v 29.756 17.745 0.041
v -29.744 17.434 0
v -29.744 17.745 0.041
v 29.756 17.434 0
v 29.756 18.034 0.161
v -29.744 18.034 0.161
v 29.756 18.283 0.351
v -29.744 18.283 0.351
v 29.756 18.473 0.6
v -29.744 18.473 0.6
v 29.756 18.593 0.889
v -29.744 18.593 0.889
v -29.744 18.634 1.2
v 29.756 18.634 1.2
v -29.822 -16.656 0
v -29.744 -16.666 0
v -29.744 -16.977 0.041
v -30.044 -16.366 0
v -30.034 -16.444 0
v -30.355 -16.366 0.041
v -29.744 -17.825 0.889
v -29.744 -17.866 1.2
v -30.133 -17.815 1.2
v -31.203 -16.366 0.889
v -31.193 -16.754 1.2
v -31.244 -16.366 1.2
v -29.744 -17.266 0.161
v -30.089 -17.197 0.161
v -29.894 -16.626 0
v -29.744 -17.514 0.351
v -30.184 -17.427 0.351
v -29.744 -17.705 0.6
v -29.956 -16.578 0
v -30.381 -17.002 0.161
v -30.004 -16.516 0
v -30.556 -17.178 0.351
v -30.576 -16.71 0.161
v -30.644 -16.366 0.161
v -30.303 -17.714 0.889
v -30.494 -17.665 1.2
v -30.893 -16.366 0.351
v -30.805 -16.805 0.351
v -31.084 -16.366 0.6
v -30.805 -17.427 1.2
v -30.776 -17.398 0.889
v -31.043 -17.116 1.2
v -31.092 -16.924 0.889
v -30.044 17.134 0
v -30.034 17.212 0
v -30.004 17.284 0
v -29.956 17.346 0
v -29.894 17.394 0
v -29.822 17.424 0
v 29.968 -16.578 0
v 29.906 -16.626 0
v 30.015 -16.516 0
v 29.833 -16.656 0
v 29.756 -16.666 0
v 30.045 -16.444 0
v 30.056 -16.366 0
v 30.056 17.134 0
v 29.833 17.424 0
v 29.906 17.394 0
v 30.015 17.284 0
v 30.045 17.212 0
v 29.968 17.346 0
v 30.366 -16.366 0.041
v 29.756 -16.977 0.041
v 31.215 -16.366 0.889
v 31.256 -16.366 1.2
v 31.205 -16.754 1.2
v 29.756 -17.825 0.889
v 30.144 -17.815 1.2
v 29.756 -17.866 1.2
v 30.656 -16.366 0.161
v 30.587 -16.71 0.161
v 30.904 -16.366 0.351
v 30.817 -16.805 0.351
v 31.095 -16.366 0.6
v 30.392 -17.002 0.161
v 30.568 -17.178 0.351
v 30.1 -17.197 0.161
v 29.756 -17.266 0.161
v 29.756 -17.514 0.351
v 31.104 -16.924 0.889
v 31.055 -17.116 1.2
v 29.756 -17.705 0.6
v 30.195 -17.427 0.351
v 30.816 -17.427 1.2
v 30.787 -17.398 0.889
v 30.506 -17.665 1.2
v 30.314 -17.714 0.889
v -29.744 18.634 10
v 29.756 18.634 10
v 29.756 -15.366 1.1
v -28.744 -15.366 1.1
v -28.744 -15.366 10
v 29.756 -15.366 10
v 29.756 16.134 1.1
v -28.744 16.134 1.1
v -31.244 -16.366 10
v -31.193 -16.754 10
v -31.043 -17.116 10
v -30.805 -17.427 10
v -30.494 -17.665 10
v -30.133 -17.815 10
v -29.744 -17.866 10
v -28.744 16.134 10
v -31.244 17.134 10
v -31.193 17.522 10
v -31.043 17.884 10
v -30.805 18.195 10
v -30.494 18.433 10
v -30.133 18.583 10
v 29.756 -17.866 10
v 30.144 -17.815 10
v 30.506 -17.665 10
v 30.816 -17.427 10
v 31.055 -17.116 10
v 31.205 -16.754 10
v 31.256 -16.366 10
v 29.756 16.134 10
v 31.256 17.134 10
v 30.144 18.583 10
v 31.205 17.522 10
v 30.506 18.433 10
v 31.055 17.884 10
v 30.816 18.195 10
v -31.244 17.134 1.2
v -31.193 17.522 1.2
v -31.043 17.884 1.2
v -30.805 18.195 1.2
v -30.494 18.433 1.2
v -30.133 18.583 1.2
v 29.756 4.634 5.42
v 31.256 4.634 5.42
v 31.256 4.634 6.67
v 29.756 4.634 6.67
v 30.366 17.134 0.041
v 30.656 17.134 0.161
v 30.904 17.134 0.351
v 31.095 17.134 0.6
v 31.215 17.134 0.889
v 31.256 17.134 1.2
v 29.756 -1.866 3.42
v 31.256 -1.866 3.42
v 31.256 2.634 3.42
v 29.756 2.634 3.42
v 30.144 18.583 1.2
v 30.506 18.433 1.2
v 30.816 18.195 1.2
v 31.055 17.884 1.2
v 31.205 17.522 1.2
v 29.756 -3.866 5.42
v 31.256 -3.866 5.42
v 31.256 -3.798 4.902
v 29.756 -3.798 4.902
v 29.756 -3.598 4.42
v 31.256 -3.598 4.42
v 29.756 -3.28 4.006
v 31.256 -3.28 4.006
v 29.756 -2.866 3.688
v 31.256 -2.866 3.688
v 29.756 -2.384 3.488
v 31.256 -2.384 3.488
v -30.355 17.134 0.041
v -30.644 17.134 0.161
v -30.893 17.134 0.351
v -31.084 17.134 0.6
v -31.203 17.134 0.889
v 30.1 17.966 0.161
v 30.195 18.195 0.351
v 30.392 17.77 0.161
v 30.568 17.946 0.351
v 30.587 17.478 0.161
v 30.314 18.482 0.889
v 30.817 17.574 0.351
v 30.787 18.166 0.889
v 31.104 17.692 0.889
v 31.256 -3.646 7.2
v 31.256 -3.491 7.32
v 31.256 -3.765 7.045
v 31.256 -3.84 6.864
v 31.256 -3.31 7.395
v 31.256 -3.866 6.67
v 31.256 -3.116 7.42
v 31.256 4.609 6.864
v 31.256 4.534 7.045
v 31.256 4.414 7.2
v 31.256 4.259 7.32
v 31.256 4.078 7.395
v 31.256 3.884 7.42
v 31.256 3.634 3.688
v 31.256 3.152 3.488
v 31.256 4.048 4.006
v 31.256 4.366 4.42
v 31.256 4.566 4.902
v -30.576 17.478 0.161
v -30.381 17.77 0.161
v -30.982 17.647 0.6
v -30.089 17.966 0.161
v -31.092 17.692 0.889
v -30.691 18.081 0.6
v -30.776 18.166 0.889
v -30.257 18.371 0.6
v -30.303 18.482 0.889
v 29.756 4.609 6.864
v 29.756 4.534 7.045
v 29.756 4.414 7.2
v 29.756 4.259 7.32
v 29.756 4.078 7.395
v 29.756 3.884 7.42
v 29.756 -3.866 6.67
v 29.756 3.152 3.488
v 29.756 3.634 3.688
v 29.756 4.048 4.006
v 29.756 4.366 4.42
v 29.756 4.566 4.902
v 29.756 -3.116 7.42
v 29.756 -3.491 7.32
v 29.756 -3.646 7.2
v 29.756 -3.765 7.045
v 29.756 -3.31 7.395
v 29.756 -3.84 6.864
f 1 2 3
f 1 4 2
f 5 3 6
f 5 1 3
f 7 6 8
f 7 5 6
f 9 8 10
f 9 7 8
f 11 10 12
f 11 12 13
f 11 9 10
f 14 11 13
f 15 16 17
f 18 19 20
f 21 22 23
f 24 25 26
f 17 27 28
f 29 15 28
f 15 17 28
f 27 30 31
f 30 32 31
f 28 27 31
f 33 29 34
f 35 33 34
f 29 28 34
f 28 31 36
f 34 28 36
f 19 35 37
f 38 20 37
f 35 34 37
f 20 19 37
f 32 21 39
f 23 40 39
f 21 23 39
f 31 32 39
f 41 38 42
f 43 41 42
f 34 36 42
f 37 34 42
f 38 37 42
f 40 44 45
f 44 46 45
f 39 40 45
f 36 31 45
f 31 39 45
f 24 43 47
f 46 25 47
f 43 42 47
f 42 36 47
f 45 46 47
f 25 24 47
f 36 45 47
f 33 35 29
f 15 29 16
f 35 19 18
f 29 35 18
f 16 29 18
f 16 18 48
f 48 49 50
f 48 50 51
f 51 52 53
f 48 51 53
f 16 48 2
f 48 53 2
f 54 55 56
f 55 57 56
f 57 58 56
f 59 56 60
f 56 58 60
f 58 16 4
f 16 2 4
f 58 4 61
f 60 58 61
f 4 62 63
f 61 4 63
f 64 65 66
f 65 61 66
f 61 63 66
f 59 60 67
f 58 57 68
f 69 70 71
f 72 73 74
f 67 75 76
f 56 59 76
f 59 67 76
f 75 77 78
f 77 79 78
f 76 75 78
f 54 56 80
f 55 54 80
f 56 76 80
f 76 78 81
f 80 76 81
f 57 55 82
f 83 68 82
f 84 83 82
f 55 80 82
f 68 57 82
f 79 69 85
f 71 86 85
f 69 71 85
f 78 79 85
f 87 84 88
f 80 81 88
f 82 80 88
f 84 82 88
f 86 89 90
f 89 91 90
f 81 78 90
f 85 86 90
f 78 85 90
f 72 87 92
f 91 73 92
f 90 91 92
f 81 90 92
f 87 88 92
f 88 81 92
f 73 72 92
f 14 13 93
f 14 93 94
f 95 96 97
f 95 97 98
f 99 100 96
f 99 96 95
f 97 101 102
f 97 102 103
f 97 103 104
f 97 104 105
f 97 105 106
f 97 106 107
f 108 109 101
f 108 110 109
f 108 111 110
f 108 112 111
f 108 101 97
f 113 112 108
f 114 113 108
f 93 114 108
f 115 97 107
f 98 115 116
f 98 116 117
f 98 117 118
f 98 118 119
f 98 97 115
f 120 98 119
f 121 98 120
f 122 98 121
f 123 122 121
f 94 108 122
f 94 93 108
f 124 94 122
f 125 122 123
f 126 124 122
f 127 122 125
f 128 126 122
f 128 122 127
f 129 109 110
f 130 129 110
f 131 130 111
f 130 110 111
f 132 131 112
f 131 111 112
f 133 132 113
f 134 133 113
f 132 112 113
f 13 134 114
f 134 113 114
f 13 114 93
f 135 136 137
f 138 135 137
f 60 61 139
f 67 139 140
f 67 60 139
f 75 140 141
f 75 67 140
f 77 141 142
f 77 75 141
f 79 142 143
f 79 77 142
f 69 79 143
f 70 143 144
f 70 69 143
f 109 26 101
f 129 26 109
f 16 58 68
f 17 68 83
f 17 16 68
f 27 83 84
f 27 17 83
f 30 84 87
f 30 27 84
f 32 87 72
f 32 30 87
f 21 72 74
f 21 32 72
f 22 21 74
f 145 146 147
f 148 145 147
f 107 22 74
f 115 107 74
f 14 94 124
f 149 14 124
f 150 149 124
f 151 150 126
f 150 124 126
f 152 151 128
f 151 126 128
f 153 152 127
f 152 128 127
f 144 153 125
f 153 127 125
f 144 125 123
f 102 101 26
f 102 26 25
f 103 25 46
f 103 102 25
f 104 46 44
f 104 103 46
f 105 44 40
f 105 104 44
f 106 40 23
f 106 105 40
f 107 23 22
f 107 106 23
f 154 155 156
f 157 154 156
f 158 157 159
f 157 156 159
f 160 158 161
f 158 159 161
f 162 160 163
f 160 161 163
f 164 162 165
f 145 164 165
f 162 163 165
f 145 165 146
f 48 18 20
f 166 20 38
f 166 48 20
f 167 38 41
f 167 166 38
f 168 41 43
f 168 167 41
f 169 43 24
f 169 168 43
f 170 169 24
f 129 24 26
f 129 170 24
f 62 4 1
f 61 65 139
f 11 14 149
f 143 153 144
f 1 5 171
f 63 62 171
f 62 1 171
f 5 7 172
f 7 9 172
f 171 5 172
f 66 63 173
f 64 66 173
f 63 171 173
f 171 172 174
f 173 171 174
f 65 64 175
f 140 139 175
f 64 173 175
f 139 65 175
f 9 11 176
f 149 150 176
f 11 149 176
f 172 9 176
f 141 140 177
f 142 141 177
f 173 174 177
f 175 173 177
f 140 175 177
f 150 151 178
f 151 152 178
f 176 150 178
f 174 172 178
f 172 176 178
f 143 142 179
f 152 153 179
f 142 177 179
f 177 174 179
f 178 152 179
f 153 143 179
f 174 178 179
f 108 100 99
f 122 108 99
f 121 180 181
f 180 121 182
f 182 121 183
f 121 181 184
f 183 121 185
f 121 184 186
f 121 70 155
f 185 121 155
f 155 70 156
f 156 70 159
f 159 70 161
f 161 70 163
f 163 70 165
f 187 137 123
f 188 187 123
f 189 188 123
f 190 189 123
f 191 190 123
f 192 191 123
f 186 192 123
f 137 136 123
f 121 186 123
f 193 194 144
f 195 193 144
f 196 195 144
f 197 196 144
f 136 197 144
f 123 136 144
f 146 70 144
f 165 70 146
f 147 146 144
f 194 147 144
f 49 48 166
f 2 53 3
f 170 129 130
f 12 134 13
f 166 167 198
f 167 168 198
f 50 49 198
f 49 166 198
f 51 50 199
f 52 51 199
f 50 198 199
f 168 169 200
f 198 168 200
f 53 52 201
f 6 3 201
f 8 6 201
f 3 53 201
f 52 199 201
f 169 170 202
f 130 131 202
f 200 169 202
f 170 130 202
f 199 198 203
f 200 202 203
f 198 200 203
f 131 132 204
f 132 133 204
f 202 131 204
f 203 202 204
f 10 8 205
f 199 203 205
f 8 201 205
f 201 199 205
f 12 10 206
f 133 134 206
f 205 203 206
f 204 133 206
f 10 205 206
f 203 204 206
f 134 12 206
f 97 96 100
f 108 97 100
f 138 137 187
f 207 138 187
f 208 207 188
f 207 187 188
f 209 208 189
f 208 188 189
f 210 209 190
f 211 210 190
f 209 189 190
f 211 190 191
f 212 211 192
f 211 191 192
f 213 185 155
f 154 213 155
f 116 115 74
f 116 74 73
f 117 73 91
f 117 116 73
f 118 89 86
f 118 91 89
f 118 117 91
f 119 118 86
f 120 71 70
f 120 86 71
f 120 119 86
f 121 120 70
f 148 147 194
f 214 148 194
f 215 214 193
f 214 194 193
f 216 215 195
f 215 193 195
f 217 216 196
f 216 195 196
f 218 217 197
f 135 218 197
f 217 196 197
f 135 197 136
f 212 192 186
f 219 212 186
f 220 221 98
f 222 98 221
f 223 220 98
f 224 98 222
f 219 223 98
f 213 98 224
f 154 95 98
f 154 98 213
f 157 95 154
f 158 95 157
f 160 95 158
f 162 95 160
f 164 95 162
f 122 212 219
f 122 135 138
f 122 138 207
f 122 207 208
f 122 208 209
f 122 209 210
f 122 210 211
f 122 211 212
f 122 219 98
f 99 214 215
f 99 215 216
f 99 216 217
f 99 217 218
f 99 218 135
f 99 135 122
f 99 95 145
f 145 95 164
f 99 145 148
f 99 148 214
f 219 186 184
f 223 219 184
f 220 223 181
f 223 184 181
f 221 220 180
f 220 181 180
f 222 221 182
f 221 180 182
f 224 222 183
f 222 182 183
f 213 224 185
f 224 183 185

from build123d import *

# Parameters (mm, degrees)
F0_W     = 62.5
F0_H     = 36.5
F0_W_2   = 58.5
F0_H_2   = 31.5
F1_DEPTH = 10
F2_DEPTH = 1.1
F3_R     = 1.5
F4_R     = 1.2
F6_DEPTH = 3


with BuildPart() as f1:
    # F0 (on Top) → F1 (new body)
    with BuildSketch(Plane.XY):
        with Locations((0.005647, 0.384062)):
            Rectangle(F0_W, F0_H)
        with Locations((0.505647, 0.384062)):
            Rectangle(F0_W_2, F0_H_2, mode=Mode.SUBTRACT)
    extrude(amount=F1_DEPTH)

    # F0 (on Top) → F2 (join)
    with BuildSketch(Plane.XY):
        with Locations((0.505647, 0.384062)):
            Rectangle(F0_W_2, F0_H_2)
    extrude(amount=F2_DEPTH)

    # F3
    f3_edges = [f1.edges().sort_by_distance(p)[0] for p in [
        (31.255647, -17.865938, 5),
        (31.255647, 18.634062, 5),
        (-31.244353, 18.634062, 5),
        (-31.244353, -17.865938, 5),
    ]]
    fillet(f3_edges, radius=F3_R)

    # F4
    f4_edges = [f1.edges().sort_by_distance(p)[0] for p in [
        (0.005647, 18.634062, 0),
        (30.816307, 18.194723, 0),
        (-30.805013, 18.194723, 0),
        (31.255647, 0.384062, 0),
        (-31.244353, 0.384062, 0),
        (30.816307, -17.426598, 0),
        (-30.805013, -17.426598, 0),
        (0.005647, -17.865938, 0),
    ]]
    fillet(f4_edges, radius=F4_R)

    # F5 (on face) → F6 (cut)
    with BuildSketch(Plane.YZ.offset(31.255647)):
        with BuildLine():
            Line((3.884062, 7.420129), (-3.115938, 7.420129))
            ThreePointArc((-3.115938, 7.420129), (-3.646268, 7.200459), (-3.865938, 6.670129))
            Line((-3.865938, 6.670129), (-3.865938, 5.420129))
            ThreePointArc((-3.865938, 5.420129), (-3.280151, 4.005916), (-1.865938, 3.420129))
            Line((-1.865938, 3.420129), (2.634062, 3.420129))
            ThreePointArc((2.634062, 3.420129), (4.048276, 4.005916), (4.634062, 5.420129))
            Line((4.634062, 5.420129), (4.634062, 6.670129))
            ThreePointArc((4.634062, 6.670129), (4.414393, 7.200459), (3.884062, 7.420129))
        make_face()
    extrude(amount=-F6_DEPTH, mode=Mode.SUBTRACT)


solid = f1.part
